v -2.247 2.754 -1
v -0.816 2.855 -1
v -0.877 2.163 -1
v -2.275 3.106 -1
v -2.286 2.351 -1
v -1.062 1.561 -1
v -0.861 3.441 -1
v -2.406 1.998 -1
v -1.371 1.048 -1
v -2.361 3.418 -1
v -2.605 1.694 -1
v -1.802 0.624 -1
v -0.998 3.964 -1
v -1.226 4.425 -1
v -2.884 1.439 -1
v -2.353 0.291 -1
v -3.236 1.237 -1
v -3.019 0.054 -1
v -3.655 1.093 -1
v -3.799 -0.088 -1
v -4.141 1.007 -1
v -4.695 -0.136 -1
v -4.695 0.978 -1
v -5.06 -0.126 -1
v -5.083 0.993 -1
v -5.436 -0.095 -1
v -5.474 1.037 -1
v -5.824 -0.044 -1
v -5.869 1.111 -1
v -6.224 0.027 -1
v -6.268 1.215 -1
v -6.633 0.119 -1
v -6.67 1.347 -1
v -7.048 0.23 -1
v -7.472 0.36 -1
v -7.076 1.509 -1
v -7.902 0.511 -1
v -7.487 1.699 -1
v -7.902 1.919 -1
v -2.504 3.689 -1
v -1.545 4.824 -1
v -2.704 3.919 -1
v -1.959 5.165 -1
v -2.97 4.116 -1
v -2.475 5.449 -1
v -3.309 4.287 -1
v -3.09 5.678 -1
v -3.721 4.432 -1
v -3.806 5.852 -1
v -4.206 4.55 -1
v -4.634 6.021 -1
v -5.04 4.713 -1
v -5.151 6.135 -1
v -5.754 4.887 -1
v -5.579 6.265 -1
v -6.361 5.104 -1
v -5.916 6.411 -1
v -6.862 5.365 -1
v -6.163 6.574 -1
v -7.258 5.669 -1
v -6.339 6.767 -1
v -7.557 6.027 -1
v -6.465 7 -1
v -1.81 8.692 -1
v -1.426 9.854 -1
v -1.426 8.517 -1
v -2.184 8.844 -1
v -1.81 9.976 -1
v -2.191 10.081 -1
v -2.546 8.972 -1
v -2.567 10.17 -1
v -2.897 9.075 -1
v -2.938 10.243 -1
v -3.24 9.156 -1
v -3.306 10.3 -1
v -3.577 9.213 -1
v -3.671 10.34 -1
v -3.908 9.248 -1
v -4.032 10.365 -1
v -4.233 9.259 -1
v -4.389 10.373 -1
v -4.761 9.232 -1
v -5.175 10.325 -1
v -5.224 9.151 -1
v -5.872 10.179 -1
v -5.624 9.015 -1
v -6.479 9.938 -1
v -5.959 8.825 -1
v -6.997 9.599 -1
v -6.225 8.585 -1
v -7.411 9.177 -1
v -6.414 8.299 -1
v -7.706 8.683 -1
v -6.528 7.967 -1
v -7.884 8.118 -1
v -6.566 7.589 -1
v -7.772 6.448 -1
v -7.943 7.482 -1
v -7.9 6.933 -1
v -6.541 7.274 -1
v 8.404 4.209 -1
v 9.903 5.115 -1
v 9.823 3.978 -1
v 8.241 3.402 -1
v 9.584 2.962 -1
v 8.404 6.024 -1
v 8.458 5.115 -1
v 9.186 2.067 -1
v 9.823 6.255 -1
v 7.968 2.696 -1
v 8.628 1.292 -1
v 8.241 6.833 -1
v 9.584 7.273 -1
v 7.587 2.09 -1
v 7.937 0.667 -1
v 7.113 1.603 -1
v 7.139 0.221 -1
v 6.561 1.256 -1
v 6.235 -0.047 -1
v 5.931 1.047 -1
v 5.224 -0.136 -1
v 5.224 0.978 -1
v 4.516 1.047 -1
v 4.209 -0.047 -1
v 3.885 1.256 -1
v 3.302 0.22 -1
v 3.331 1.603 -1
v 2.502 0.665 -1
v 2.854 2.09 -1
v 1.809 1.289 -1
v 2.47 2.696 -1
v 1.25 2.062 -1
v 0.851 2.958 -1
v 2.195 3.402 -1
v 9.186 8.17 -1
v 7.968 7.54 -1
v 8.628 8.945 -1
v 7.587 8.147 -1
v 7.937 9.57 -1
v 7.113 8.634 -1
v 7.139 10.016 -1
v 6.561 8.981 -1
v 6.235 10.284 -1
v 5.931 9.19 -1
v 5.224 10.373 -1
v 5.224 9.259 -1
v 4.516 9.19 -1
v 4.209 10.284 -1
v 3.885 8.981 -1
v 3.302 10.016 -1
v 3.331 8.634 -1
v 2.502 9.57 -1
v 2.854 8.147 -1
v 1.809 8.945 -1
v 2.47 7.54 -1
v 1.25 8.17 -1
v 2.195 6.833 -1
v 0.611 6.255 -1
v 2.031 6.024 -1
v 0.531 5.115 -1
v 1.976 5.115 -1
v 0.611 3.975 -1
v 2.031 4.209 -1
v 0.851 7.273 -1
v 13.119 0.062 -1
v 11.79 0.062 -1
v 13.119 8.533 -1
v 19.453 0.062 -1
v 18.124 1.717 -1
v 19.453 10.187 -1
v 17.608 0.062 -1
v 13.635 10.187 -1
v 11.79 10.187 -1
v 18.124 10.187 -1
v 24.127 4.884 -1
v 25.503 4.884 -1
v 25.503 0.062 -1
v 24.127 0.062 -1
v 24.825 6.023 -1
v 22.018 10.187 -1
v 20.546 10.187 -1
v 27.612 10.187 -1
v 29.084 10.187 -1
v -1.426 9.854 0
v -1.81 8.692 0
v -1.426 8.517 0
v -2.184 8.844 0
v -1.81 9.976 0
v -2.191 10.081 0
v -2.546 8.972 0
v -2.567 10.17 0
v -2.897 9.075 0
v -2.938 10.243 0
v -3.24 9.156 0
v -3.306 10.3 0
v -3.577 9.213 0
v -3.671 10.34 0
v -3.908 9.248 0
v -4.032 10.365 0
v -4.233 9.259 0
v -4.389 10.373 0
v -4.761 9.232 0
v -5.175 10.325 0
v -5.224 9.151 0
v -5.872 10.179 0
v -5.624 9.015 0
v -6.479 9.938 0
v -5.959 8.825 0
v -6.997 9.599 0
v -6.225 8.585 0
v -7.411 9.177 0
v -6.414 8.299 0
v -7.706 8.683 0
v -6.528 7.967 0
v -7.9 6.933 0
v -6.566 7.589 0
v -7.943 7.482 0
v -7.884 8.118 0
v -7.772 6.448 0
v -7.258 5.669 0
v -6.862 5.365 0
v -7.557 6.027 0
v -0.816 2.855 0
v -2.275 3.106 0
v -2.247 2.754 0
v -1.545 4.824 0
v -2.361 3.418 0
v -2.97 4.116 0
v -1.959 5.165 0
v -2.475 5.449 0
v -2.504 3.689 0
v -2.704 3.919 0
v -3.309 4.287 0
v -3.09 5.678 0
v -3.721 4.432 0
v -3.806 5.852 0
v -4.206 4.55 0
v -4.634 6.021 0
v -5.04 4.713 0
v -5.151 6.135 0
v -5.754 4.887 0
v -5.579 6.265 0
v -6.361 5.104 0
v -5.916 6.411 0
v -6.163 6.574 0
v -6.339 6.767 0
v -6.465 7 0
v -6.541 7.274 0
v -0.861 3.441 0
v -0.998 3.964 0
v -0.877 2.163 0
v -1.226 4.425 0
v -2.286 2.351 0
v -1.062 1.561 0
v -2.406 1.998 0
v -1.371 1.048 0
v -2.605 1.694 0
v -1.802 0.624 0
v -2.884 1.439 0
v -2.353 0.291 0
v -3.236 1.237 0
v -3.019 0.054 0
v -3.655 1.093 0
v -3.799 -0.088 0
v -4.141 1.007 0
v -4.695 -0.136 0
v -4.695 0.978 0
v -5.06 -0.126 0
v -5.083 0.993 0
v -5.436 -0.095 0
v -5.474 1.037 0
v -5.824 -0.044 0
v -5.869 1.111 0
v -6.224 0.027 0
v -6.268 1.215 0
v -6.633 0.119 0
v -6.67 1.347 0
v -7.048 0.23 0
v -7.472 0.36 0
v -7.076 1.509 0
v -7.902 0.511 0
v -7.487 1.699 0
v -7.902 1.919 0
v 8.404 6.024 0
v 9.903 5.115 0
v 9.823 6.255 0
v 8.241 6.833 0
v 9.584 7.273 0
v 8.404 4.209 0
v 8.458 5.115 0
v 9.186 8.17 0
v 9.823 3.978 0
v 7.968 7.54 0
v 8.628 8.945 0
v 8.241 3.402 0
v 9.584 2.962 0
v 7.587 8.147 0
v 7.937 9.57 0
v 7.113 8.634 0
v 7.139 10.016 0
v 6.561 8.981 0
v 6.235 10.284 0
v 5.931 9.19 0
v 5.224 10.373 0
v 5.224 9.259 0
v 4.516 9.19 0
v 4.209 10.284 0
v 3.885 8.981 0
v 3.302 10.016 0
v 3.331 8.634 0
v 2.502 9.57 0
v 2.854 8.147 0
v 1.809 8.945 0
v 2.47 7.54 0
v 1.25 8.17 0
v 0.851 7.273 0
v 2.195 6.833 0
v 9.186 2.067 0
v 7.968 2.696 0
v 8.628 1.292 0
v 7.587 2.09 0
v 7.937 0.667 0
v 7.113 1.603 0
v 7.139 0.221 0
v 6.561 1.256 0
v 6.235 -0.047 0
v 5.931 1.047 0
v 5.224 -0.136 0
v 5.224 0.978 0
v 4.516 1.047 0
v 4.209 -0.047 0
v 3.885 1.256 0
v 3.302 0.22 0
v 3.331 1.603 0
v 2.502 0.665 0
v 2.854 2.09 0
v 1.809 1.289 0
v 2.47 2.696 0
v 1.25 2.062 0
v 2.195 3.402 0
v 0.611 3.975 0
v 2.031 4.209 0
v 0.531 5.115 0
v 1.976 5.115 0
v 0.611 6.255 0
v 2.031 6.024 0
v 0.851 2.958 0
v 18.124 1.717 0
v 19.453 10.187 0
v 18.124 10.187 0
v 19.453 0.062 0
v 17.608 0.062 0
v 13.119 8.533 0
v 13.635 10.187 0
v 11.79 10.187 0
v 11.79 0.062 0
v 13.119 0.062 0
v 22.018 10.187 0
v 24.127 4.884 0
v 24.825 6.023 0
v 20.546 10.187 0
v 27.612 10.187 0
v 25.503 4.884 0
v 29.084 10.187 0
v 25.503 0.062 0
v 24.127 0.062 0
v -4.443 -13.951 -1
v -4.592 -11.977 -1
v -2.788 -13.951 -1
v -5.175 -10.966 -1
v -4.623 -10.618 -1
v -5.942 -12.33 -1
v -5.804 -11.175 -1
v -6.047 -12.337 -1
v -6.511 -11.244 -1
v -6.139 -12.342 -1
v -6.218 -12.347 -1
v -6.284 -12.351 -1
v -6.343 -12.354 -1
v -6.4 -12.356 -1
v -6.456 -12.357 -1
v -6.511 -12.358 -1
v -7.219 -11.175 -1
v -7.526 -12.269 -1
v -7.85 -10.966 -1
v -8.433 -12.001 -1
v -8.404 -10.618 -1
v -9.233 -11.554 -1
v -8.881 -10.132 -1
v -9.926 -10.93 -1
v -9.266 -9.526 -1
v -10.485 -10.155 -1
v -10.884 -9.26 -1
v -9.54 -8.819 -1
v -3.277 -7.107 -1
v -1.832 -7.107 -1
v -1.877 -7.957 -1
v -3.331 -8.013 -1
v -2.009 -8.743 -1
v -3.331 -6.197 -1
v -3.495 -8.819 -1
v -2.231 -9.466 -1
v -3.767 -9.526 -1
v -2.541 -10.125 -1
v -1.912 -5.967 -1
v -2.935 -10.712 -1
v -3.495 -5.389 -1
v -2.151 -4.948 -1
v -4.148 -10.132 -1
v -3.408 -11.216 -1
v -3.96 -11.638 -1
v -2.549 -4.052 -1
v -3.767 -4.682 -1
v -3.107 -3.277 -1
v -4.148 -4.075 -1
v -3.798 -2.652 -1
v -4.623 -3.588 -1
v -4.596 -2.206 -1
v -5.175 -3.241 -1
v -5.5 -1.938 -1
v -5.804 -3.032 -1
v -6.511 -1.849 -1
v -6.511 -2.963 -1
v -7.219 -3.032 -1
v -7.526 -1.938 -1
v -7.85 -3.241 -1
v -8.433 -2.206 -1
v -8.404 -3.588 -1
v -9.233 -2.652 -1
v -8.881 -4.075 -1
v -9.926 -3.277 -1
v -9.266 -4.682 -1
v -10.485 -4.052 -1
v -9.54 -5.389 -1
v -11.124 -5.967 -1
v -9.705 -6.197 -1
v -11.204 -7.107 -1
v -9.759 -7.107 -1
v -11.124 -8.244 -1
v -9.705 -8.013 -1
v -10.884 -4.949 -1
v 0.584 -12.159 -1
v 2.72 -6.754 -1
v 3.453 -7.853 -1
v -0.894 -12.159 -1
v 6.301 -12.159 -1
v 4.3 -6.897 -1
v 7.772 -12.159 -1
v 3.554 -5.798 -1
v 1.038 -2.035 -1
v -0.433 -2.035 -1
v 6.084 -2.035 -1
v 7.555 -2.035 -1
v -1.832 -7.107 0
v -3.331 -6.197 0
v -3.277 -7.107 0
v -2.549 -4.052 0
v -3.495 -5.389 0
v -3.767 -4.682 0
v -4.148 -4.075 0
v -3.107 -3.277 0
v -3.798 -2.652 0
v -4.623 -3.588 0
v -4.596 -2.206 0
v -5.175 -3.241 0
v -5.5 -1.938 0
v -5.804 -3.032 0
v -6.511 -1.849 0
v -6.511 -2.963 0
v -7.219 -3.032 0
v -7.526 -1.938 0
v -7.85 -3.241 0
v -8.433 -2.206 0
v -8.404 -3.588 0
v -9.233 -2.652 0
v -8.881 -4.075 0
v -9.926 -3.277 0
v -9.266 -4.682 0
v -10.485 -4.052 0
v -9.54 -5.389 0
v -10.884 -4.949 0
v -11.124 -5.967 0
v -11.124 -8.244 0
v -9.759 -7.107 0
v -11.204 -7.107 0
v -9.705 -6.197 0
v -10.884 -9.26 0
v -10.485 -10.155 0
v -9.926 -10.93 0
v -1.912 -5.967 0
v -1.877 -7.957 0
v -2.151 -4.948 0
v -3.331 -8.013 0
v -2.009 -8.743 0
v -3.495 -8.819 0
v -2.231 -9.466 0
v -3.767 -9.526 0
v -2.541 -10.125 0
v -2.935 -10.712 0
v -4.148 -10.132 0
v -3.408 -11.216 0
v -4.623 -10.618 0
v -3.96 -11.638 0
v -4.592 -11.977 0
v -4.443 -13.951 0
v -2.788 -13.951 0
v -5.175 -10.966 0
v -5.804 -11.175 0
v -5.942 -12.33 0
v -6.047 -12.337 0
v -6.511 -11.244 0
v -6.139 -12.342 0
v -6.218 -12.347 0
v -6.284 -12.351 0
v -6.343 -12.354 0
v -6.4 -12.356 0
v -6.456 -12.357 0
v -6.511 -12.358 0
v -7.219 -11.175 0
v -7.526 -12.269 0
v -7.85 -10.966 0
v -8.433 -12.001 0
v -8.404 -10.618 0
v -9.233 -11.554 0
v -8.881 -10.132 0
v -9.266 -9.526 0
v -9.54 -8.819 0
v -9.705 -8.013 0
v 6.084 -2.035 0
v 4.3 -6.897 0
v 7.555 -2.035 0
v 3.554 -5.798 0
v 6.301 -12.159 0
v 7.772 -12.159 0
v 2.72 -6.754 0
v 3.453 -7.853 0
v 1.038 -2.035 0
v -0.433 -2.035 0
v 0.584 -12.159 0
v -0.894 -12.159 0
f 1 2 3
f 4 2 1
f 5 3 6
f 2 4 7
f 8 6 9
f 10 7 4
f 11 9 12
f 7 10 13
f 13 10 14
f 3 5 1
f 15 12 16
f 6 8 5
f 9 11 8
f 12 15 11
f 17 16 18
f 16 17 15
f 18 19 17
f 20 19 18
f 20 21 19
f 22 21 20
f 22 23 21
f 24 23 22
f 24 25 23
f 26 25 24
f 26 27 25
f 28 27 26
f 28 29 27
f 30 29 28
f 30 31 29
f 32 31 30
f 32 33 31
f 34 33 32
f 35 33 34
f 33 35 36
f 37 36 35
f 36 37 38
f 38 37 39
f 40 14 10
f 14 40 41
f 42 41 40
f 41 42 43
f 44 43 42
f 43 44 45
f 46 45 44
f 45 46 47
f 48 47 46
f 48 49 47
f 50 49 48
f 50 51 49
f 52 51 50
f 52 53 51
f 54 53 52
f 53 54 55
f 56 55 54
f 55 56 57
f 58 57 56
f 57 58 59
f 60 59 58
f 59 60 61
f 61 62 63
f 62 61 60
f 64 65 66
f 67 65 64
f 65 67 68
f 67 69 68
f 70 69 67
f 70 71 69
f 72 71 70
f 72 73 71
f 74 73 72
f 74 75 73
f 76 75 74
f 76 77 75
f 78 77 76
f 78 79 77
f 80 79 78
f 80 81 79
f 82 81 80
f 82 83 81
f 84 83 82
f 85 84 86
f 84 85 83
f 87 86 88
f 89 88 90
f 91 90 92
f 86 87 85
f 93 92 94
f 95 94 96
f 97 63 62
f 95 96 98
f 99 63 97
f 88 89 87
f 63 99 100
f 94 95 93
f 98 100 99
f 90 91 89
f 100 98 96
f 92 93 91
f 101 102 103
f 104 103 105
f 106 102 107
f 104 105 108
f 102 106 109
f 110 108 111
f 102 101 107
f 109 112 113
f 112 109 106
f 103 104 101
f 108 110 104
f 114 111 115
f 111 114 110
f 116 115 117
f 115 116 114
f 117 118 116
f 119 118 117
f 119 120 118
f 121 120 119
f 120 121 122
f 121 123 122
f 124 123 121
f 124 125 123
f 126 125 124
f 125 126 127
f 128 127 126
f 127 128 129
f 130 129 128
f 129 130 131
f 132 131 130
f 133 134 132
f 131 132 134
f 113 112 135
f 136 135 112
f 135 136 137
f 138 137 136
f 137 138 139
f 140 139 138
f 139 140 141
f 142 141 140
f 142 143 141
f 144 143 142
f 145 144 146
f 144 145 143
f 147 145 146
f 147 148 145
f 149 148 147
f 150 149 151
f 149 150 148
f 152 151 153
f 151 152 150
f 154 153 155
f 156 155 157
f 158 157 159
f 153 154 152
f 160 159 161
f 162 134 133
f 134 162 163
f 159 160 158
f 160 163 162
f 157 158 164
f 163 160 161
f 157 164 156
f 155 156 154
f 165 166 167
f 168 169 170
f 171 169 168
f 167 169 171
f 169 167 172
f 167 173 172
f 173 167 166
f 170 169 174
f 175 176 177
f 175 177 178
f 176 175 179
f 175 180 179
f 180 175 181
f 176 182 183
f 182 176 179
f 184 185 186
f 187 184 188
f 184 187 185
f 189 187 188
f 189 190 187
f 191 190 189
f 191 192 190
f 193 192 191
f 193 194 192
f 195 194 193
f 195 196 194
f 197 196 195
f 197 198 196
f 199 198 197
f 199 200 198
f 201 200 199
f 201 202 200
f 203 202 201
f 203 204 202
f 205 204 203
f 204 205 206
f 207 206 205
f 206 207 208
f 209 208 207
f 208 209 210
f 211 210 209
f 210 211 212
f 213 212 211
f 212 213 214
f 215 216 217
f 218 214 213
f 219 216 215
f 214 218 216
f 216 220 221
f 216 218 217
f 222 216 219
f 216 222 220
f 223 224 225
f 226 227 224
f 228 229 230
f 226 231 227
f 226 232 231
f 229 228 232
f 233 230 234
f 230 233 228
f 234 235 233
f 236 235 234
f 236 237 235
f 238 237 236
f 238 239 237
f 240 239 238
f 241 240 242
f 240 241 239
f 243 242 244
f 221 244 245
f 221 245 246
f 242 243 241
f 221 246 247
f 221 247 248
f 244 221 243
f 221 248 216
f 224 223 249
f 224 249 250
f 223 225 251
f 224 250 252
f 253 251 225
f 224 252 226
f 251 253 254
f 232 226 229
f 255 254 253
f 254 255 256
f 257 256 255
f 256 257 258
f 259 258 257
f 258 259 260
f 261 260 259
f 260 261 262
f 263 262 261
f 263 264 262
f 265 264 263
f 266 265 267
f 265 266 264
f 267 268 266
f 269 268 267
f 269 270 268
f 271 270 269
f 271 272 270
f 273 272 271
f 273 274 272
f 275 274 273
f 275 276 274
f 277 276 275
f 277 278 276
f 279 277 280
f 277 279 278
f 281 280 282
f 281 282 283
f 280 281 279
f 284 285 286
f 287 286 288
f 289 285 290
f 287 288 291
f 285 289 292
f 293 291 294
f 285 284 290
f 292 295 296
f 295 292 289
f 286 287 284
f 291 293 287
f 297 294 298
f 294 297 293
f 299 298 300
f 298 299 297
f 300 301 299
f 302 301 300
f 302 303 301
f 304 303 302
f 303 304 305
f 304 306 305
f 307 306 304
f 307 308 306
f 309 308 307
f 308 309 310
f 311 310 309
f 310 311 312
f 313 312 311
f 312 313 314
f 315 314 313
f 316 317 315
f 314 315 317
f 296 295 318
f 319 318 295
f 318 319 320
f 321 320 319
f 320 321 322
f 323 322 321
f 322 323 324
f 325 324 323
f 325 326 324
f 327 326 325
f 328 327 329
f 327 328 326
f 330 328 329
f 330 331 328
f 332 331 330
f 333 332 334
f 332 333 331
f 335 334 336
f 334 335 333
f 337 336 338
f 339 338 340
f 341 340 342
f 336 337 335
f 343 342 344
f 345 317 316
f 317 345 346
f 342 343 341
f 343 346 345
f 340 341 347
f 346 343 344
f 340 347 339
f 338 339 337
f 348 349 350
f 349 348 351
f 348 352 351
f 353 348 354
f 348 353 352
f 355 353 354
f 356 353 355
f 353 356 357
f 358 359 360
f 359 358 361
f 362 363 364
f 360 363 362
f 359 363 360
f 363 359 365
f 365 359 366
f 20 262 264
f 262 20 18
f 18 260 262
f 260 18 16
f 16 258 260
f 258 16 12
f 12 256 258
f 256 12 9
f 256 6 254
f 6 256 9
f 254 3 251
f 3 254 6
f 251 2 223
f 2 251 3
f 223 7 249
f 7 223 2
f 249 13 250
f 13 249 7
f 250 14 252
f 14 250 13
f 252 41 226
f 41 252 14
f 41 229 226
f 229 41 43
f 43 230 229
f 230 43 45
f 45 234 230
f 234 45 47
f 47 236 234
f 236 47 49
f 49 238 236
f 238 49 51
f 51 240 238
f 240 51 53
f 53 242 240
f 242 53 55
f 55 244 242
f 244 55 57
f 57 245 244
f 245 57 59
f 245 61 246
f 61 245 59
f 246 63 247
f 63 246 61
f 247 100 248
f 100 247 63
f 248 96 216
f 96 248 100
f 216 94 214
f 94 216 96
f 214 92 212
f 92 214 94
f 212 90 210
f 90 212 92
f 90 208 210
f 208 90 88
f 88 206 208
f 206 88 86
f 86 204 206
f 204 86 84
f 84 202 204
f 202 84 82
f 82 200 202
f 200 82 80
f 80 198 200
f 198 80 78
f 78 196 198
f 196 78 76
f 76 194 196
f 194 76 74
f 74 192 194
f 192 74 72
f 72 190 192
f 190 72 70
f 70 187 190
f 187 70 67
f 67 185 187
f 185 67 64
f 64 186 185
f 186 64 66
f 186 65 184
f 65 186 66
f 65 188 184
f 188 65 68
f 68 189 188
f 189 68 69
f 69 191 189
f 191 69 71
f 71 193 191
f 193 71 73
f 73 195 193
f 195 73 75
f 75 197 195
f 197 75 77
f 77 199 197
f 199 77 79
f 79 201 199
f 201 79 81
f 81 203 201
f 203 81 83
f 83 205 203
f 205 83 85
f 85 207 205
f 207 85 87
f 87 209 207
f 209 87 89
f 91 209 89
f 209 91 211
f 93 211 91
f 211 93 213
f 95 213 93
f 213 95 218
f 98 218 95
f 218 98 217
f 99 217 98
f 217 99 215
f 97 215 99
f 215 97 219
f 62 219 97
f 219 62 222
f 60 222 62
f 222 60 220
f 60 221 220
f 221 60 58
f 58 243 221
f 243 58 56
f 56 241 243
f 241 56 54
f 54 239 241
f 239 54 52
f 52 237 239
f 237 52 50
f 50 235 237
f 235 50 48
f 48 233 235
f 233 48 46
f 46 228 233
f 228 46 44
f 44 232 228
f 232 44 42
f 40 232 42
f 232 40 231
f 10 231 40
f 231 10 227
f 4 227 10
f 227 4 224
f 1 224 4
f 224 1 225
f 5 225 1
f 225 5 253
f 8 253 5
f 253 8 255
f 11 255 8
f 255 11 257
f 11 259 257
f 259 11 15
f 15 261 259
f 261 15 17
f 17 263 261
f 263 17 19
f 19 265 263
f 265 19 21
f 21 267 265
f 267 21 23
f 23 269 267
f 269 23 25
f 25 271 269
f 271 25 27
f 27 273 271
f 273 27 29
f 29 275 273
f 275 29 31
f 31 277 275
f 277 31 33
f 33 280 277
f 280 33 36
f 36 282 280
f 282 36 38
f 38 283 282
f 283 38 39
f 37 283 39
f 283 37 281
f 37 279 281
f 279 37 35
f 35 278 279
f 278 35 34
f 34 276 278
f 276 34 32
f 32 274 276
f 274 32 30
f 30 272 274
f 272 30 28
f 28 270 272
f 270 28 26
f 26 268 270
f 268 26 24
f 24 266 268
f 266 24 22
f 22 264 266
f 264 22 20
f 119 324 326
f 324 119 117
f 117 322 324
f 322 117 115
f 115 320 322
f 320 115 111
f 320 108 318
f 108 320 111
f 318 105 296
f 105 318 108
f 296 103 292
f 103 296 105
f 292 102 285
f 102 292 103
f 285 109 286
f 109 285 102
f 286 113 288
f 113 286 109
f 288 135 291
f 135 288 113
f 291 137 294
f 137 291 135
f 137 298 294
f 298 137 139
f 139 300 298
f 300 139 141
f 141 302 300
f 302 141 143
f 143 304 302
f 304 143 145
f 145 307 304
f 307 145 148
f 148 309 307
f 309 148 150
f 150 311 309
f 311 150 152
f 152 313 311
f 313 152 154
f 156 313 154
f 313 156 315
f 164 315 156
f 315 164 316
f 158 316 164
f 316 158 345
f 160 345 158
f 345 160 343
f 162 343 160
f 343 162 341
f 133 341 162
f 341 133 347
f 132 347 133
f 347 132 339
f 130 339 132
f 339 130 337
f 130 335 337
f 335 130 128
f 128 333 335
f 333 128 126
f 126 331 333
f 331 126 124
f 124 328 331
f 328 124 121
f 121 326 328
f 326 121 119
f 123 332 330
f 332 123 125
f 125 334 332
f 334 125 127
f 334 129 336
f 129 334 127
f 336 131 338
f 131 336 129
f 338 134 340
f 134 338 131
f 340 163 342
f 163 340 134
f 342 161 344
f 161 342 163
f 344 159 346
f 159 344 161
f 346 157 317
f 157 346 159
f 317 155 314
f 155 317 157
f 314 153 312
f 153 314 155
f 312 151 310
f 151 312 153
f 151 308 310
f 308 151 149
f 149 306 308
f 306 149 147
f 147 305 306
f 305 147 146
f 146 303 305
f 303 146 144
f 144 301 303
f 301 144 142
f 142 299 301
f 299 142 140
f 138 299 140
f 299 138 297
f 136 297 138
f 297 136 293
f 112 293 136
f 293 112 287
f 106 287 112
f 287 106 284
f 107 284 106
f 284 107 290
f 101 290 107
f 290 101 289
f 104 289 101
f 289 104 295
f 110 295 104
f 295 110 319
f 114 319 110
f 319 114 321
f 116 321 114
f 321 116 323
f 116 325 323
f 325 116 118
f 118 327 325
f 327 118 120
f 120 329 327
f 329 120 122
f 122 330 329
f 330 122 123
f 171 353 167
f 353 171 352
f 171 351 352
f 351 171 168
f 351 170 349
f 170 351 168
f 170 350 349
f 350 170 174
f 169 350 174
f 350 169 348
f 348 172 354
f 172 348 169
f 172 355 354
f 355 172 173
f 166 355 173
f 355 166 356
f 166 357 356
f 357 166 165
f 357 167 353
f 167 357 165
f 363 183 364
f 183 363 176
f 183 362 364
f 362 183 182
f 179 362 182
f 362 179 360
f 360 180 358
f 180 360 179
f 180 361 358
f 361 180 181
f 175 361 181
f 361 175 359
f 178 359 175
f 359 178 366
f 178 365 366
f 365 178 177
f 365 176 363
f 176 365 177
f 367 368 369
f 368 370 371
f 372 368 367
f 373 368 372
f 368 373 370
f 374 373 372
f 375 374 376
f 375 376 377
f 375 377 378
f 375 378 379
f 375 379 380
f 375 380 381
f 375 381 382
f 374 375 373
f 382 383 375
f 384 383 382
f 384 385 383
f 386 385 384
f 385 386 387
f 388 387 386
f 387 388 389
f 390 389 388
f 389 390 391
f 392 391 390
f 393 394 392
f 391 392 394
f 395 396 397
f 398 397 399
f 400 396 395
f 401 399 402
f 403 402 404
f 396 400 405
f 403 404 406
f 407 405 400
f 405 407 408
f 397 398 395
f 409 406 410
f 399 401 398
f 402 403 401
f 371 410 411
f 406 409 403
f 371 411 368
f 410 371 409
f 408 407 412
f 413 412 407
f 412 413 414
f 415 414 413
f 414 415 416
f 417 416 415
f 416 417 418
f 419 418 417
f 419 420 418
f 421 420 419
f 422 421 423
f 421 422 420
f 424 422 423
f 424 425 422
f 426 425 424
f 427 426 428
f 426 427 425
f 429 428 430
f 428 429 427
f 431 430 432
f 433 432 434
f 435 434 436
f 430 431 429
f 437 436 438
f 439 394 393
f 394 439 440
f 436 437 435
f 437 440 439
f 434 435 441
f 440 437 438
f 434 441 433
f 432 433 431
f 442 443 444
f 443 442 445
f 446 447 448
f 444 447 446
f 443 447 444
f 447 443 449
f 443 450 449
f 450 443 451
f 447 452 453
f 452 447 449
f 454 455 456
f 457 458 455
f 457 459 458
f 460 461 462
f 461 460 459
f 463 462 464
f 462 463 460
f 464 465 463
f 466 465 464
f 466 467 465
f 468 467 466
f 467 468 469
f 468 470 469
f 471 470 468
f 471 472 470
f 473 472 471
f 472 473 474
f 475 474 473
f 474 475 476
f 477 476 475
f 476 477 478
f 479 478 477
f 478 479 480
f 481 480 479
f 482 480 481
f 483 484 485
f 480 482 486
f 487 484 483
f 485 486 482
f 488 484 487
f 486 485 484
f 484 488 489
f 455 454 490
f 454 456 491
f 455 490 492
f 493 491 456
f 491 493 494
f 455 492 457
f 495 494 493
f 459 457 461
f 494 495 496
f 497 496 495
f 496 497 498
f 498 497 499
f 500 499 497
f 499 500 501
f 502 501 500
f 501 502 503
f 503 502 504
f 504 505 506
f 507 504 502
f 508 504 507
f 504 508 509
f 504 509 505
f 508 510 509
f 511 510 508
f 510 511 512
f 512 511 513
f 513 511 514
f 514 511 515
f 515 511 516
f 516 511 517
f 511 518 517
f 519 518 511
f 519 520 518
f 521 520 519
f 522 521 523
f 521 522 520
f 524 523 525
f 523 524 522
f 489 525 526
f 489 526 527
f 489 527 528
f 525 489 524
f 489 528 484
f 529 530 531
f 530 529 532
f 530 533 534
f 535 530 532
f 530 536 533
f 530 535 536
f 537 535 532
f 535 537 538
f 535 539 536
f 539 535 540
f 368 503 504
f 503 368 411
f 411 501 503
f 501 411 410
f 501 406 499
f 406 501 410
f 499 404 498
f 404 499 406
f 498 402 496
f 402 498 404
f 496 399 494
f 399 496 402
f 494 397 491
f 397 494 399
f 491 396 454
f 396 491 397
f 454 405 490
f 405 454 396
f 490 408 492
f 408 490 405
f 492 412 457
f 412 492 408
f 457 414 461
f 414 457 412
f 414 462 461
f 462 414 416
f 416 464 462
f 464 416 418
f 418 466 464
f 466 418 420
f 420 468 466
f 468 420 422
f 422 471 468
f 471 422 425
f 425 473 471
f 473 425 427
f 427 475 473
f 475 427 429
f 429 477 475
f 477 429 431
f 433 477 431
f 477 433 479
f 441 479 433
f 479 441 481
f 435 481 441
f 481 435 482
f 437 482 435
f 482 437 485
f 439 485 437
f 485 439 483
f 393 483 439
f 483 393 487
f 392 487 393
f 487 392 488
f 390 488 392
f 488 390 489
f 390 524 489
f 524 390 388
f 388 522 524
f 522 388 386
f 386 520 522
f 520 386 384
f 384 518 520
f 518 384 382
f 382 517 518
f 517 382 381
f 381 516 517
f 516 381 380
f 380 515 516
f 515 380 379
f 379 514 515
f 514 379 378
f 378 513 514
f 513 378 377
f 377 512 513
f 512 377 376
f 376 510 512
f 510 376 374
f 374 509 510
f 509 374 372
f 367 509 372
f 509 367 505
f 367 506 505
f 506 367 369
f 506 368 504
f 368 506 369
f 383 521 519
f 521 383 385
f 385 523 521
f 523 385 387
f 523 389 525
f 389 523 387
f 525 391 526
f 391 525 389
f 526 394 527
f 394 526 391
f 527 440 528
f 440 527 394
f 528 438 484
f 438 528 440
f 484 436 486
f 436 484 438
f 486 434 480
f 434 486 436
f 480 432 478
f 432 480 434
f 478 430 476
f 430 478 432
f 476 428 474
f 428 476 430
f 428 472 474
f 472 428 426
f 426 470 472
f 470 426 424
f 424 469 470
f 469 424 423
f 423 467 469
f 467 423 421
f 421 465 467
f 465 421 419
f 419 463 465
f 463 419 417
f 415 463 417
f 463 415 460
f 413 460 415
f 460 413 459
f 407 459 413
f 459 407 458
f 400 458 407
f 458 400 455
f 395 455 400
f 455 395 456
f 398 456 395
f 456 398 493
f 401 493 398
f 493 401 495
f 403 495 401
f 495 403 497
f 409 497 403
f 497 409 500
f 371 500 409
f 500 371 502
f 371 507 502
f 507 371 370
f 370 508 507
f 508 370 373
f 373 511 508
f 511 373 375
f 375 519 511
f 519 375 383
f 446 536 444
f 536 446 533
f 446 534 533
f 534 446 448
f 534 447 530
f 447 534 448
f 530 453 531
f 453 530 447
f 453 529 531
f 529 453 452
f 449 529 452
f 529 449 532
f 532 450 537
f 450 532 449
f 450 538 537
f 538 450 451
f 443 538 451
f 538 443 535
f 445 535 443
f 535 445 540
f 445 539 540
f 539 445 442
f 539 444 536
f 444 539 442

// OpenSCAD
//difference() {

//    translate([0,0,-3])
//    cylinder(h=3, r=36, $fn=256);
    
    translate([10,5,-1])
    linear_extrude(1)
    text("SONY", size=10, font="SONY's Logo:style=Regular",halign="center", valign="center");
    

    translate([-2,-8,-1])
    linear_extrude(1)
    text("QX", size=10, font="Pathway Extreme:style=ExtraLight",halign="center", valign="center");
//}
